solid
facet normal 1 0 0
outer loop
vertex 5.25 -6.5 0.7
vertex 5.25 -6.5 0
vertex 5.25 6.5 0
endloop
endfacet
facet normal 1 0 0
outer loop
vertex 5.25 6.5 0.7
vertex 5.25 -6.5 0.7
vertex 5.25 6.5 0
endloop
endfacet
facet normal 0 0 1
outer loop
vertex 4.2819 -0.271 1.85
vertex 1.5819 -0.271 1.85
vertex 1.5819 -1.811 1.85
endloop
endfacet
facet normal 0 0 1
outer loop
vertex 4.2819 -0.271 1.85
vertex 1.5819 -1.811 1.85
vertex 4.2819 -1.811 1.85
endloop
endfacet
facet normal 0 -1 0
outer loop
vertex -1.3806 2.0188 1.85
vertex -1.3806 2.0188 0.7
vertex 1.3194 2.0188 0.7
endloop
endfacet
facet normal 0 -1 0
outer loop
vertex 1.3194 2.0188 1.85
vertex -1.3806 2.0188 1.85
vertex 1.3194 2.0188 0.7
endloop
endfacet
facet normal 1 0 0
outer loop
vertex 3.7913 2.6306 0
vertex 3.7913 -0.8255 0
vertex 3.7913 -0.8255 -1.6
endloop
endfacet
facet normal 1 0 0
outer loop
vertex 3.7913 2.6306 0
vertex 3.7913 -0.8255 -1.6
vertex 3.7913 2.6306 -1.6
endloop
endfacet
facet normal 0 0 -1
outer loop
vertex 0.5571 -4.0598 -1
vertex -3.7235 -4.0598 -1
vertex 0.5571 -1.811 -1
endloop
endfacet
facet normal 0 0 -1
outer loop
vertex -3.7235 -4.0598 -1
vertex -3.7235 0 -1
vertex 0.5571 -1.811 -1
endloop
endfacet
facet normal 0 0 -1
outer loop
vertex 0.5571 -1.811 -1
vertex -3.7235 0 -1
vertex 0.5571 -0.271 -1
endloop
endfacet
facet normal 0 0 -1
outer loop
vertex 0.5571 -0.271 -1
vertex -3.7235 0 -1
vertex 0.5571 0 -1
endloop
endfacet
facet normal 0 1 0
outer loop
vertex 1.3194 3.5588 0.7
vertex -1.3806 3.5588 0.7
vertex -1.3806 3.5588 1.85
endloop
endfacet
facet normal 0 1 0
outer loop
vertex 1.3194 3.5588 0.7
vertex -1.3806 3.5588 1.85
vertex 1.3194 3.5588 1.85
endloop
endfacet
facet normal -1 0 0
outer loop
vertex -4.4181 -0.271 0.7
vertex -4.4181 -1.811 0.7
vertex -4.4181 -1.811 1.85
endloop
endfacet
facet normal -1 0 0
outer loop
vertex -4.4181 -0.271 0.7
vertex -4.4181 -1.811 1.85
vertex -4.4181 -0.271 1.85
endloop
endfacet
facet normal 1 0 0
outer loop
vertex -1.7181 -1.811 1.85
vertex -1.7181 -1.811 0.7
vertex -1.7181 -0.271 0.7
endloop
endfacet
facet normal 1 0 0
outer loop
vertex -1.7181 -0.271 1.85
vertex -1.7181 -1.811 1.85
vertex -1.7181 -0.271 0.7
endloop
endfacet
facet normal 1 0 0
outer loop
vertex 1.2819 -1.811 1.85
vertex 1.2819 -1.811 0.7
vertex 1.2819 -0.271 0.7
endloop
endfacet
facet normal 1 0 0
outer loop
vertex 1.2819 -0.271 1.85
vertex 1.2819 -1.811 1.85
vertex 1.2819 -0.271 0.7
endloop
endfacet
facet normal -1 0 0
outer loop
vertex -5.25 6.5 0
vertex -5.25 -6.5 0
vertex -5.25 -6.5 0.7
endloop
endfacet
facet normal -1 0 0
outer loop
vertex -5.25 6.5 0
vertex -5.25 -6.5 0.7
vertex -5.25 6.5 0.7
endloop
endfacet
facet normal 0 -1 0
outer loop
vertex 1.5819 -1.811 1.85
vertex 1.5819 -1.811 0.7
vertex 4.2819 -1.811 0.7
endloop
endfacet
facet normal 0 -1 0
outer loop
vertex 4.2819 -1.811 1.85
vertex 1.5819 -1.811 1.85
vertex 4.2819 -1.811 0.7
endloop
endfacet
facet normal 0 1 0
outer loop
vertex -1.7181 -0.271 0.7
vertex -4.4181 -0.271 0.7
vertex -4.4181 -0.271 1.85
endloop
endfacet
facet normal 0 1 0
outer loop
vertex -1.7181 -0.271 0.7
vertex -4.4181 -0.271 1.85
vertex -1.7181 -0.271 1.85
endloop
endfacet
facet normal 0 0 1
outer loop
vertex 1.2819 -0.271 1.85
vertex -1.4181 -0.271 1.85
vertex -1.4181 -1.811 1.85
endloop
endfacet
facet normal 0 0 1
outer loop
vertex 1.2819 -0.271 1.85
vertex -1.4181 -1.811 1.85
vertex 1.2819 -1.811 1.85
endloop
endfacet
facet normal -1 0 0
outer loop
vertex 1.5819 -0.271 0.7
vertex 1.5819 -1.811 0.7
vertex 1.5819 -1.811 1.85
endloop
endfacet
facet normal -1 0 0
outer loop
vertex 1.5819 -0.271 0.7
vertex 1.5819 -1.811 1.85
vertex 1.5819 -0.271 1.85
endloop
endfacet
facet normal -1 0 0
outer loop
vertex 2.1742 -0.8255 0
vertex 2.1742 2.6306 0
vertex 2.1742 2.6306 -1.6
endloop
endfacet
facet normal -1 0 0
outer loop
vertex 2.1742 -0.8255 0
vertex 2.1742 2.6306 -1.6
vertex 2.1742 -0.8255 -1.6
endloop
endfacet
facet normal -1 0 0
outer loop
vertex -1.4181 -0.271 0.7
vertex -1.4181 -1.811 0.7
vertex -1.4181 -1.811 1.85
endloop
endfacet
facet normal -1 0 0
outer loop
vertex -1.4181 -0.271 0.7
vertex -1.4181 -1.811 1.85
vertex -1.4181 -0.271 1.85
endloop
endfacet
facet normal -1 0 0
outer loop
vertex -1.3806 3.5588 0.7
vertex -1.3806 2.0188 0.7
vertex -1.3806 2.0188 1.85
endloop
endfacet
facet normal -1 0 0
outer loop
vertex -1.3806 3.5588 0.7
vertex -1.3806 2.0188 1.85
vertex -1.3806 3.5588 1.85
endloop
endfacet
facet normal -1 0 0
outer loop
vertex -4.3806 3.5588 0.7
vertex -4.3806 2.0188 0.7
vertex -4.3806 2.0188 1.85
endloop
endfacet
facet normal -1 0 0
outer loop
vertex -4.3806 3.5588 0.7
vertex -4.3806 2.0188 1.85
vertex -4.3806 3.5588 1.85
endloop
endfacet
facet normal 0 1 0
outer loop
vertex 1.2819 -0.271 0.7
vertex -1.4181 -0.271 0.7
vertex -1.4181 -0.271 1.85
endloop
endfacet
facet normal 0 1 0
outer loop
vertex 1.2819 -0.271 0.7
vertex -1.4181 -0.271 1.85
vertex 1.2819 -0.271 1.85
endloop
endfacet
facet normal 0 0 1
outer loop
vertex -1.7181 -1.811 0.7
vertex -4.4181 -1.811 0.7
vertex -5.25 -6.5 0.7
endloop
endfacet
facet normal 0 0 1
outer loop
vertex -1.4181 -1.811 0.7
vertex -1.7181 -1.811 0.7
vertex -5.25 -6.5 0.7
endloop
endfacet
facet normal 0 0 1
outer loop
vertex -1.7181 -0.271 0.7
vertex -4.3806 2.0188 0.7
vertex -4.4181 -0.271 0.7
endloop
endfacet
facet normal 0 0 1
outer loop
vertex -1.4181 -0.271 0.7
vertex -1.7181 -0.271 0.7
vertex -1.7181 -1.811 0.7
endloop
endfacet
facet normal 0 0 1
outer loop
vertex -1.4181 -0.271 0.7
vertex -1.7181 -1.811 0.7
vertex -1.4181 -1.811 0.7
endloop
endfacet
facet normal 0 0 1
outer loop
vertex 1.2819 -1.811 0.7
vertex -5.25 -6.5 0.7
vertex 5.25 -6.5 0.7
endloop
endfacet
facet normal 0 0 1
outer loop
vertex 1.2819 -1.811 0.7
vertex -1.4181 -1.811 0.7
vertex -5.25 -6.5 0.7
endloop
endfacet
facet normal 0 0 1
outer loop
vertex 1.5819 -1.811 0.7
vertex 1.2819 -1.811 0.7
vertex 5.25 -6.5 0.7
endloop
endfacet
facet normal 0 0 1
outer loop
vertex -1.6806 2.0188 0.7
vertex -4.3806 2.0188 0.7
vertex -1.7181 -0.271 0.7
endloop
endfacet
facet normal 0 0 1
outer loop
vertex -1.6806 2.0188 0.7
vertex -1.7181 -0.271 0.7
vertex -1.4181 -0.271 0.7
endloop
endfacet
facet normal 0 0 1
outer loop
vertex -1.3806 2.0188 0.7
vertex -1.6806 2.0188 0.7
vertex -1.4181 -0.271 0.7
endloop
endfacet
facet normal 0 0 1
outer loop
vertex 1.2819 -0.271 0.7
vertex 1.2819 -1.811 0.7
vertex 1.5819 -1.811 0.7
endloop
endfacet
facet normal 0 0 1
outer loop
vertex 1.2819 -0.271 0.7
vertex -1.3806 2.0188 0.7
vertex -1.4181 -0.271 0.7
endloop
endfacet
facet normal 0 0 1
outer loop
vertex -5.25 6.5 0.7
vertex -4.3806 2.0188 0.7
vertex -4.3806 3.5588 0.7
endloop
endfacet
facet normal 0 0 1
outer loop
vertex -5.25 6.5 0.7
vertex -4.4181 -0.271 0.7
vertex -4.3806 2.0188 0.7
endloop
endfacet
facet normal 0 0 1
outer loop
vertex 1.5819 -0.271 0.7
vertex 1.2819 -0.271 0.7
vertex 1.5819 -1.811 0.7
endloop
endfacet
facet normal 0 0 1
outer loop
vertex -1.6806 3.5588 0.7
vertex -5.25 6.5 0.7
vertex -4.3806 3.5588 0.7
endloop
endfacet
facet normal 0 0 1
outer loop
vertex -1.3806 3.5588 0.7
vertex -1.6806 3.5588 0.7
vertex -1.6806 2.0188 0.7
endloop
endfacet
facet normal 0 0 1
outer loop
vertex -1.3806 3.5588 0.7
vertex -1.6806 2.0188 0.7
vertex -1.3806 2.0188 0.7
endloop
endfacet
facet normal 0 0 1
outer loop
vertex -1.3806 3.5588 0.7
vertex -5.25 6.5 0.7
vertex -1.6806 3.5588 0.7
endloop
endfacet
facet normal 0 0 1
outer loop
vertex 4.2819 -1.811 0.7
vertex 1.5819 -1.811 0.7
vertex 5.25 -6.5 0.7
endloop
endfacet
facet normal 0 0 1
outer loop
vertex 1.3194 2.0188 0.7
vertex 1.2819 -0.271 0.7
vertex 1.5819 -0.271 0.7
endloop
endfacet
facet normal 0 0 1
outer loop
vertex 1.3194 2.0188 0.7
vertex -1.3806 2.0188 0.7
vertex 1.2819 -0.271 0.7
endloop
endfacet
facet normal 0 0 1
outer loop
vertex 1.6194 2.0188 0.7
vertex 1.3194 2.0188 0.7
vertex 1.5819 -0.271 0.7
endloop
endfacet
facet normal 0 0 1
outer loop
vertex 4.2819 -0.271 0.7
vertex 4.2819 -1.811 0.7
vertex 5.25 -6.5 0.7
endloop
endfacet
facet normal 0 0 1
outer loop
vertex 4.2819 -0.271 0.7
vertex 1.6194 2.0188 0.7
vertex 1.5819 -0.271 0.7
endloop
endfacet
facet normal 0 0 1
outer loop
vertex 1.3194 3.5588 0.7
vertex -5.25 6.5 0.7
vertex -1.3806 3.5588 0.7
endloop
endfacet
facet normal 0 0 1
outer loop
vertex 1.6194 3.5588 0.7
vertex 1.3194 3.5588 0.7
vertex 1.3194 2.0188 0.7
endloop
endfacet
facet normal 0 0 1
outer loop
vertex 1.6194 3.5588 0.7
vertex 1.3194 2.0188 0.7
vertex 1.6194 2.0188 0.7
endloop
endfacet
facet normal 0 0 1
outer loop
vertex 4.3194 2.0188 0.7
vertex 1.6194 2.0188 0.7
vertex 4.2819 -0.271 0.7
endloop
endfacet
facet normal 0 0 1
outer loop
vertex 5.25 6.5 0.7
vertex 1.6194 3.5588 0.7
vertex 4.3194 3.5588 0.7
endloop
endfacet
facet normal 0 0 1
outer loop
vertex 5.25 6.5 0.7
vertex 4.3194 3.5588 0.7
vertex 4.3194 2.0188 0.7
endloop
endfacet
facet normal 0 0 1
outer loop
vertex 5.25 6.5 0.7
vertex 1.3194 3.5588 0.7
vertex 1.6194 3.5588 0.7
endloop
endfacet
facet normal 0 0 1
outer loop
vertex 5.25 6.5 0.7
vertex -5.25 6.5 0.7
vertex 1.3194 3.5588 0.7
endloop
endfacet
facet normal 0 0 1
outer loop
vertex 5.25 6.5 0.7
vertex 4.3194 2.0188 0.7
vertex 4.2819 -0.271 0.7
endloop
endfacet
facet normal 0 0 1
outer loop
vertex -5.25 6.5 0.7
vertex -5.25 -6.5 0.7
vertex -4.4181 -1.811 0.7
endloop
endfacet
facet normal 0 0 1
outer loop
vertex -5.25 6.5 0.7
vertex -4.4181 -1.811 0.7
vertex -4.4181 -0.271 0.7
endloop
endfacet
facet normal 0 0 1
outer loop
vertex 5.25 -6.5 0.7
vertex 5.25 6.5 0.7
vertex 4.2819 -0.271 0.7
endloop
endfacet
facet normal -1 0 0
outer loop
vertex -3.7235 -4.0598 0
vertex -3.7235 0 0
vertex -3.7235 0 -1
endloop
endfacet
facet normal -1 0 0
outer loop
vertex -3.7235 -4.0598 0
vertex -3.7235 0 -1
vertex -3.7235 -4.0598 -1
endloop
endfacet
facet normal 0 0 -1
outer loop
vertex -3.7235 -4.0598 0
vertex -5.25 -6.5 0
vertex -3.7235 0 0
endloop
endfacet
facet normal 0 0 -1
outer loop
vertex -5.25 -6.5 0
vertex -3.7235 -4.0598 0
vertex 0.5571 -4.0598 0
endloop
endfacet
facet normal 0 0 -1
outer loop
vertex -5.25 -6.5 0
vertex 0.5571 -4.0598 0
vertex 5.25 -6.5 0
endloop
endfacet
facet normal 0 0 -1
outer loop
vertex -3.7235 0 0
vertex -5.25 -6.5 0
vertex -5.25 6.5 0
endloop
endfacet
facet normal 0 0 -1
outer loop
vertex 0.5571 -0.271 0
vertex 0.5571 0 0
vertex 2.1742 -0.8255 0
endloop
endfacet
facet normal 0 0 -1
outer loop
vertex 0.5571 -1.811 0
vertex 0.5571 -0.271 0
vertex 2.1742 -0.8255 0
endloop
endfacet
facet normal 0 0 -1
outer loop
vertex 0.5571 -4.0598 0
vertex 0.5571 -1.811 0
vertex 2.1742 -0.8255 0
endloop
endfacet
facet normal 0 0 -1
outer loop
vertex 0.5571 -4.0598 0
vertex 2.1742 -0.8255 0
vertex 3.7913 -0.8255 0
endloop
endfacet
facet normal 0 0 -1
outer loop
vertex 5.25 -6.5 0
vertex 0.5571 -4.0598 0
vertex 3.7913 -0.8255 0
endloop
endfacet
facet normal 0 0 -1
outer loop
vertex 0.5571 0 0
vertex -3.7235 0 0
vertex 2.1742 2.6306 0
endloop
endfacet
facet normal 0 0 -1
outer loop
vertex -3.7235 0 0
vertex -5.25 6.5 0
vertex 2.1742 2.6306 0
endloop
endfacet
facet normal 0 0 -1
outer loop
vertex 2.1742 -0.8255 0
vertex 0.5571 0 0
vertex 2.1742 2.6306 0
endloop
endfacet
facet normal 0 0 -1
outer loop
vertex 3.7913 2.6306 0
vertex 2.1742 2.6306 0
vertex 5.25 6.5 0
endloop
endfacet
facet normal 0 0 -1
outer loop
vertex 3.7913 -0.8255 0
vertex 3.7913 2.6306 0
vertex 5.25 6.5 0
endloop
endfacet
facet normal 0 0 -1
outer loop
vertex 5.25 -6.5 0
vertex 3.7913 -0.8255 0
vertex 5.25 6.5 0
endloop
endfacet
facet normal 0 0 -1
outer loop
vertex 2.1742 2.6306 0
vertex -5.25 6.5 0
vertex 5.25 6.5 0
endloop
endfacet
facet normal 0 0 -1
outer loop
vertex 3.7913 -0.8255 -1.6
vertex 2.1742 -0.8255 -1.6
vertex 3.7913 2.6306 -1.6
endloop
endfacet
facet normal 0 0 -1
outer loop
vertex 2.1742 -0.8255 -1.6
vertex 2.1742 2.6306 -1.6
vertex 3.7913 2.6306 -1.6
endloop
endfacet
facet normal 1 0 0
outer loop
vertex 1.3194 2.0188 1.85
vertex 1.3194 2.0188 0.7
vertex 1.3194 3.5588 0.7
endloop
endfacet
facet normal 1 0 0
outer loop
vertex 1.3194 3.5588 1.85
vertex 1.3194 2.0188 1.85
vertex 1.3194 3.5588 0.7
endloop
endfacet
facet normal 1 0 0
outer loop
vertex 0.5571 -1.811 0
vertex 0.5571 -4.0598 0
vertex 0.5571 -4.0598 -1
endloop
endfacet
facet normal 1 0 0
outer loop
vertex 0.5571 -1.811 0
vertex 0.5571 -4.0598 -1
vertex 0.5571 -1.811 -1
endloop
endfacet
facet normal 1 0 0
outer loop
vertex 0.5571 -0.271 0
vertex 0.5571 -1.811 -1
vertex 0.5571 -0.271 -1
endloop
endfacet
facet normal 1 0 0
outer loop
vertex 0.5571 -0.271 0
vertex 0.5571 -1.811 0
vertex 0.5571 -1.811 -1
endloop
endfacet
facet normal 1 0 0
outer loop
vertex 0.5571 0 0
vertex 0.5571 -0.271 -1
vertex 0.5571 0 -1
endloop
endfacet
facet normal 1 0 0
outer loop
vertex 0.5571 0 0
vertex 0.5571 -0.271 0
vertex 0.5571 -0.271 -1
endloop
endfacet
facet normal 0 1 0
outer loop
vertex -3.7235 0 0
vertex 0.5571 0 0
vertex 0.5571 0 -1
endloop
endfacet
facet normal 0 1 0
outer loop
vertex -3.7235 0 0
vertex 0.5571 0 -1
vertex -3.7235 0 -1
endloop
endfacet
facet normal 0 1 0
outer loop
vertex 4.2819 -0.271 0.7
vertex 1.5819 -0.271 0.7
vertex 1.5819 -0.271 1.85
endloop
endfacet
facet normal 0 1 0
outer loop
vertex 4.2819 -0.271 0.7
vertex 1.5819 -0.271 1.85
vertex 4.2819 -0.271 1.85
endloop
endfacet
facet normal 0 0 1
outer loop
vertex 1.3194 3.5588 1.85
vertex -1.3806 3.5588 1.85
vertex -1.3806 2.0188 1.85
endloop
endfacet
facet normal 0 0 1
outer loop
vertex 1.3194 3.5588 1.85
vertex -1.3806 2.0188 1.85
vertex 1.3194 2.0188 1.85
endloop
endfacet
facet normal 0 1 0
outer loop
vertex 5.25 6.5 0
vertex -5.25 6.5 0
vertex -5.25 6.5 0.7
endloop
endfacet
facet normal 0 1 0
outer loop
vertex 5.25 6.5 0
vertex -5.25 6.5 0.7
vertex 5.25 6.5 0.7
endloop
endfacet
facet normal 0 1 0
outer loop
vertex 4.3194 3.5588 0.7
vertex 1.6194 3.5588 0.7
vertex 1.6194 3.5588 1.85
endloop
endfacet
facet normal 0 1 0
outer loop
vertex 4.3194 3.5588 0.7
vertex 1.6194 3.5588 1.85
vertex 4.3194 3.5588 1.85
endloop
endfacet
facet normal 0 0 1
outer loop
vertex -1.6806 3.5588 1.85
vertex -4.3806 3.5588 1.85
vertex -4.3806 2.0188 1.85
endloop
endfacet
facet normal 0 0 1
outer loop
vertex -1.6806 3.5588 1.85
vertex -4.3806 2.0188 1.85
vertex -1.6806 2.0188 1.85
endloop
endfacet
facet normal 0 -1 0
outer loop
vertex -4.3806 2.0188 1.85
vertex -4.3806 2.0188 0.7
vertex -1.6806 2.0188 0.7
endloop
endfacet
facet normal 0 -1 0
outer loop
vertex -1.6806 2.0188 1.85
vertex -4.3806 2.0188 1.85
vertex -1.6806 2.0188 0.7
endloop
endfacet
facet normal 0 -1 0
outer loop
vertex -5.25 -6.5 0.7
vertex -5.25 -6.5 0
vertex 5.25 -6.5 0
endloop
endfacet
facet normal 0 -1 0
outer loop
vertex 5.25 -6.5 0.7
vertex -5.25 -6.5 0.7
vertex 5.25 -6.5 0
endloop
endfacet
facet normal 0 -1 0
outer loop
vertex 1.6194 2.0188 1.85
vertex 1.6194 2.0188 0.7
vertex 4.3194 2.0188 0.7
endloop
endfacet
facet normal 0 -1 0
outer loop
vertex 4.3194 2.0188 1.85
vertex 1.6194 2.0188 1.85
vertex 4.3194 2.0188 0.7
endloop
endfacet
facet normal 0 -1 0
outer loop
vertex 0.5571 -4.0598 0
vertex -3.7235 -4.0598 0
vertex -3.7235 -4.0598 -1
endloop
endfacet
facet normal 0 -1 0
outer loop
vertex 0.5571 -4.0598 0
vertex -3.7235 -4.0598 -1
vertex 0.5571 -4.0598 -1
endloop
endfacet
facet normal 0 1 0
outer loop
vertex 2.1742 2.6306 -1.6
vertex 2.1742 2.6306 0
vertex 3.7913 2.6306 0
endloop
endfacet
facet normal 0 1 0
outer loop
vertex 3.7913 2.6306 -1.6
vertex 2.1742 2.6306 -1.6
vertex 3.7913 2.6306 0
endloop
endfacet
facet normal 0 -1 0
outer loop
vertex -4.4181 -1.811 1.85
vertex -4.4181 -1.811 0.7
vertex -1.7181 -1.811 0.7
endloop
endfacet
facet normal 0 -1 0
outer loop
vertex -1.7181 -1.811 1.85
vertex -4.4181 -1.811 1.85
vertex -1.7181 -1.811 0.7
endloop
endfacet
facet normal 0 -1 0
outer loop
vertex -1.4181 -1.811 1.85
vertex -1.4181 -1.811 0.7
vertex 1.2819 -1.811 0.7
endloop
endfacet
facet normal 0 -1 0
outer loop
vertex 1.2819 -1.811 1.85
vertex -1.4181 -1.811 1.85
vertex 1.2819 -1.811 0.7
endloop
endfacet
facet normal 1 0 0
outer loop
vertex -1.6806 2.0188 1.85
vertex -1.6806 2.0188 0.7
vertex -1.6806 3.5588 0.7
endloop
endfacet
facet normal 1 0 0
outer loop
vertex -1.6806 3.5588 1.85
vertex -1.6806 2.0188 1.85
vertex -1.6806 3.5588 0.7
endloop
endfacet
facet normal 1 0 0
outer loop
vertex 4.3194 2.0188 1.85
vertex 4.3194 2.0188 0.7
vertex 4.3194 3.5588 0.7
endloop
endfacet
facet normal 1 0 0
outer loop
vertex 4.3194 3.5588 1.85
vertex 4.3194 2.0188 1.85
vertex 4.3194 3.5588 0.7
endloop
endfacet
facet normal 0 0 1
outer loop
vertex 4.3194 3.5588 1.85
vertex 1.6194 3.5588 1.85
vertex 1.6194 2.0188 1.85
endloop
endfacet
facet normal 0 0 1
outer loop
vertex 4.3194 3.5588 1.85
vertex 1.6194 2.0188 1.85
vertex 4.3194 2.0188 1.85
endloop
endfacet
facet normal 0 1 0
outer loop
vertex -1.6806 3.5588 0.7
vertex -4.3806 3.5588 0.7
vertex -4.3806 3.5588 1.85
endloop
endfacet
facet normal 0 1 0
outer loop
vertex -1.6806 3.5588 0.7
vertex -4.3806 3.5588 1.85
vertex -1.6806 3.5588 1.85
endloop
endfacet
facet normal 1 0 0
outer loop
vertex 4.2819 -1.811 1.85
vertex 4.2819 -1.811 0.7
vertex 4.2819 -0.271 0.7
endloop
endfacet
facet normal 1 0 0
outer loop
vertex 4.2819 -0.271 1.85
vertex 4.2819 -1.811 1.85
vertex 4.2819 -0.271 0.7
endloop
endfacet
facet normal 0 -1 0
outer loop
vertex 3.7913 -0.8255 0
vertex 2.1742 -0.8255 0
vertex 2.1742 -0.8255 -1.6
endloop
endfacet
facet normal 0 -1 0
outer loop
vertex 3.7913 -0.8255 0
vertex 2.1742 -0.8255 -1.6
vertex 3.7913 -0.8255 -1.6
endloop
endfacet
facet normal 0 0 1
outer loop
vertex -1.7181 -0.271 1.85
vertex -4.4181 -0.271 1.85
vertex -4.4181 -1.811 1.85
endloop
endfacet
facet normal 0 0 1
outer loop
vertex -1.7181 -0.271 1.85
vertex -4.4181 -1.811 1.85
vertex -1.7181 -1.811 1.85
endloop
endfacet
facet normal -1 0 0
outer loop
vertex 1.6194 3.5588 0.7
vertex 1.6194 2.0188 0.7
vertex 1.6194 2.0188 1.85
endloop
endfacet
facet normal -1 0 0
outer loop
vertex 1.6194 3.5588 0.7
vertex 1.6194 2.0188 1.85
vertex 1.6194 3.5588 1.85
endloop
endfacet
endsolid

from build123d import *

# Parameters (mm, degrees)
F0_W     = 10.5
F0_H     = 13
F0_W_2   = 2.7
F0_H_2   = 1.54
F1_DEPTH = 0.7
F2_DEPTH = 1.85
F3_W     = 1.9751354622
F3_H     = 1.54
F3_W_2   = 2.0054427082
F4_DEPTH = 1
F3_W_3   = 1.6171073075
F3_H_2   = 0.5545145935
F3_H_3   = 2.2898169597
F3_H_4   = 0.6118393503
F5_DEPTH = 1.6


with BuildPart() as f1:
    # F0 (on Top) → F1 (new body)
    with BuildSketch(Plane.XY):
        Rectangle(F0_W, F0_H)
        with Locations((-3.0680515347, -1.0410206797)):
            Rectangle(F0_W_2, F0_H_2, mode=Mode.SUBTRACT)
        with Locations((-0.0680515347, -1.0410206797)):
            Rectangle(F0_W_2, F0_H_2, mode=Mode.SUBTRACT)
        with Locations((2.9319484653, -1.0410206797)):
            Rectangle(F0_W_2, F0_H_2, mode=Mode.SUBTRACT)
        with Locations((-3.0306075118, 2.78879628)):
            Rectangle(F0_W_2, F0_H_2, mode=Mode.SUBTRACT)
        with Locations((-0.0306075118, 2.78879628)):
            Rectangle(F0_W_2, F0_H_2, mode=Mode.SUBTRACT)
        with Locations((2.9693924882, 2.78879628)):
            Rectangle(F0_W_2, F0_H_2, mode=Mode.SUBTRACT)
        with Locations((-3.0680515347, -1.0410206797)):
            Rectangle(F0_W_2, F0_H_2)
        with Locations((-3.0306075118, 2.78879628)):
            Rectangle(F0_W_2, F0_H_2)
        with Locations((-0.0306075118, 2.78879628)):
            Rectangle(F0_W_2, F0_H_2)
        with Locations((-0.0680515347, -1.0410206797)):
            Rectangle(F0_W_2, F0_H_2)
        with Locations((2.9319484653, -1.0410206797)):
            Rectangle(F0_W_2, F0_H_2)
        with Locations((2.9693924882, 2.78879628)):
            Rectangle(F0_W_2, F0_H_2)
    extrude(amount=F1_DEPTH)

    # F0 (on Top) → F2 (join)
    with BuildSketch(Plane.XY):
        with Locations((-3.0680515347, -1.0410206797)):
            Rectangle(F0_W_2, F0_H_2)
        with Locations((-0.0680515347, -1.0410206797)):
            Rectangle(F0_W_2, F0_H_2)
        with Locations((2.9319484653, -1.0410206797)):
            Rectangle(F0_W_2, F0_H_2)
        with Locations((2.9693924882, 2.78879628)):
            Rectangle(F0_W_2, F0_H_2)
        with Locations((-0.0306075118, 2.78879628)):
            Rectangle(F0_W_2, F0_H_2)
        with Locations((-3.0306075118, 2.78879628)):
            Rectangle(F0_W_2, F0_H_2)
    extrude(amount=F2_DEPTH)

    # F3 (on face) → F4 (join)
    with BuildSketch(Plane.XY):
        Polygon((-3.7234942429, -1.8110206797), (-3.7234942429, -4.0597501211), (0.5570839276, -4.0597501211), (0.5570839276, -1.8110206797), (-1.4180515347, -1.8110206797), (-1.4180515347, -0.2710206797), (0.5570839276, -0.2710206797), (0.5570839276, 0), (-3.7234942429, 0), (-3.7234942429, -0.2710206797), (-1.7180515347, -0.2710206797), (-1.7180515347, -1.8110206797), align=None)
        with Locations((-0.4304838036, -1.0410206797)):
            Rectangle(F3_W, F3_H)
        with Locations((-2.7207728888, -1.0410206797)):
            Rectangle(F3_W_2, F3_H)
    extrude(amount=-F4_DEPTH)

    # F3 (on face) → F5 (join)
    with BuildSketch(Plane.XY):
        with Locations((2.9827450635, -0.5482779764)):
            Rectangle(F3_W_3, F3_H_2)
        with Locations((2.9827450635, 0.8738878002)):
            Rectangle(F3_W_3, F3_H_3)
        with Locations((2.9827450635, 2.3247159552)):
            Rectangle(F3_W_3, F3_H_4)
    extrude(amount=-F5_DEPTH)


solid = f1.part
